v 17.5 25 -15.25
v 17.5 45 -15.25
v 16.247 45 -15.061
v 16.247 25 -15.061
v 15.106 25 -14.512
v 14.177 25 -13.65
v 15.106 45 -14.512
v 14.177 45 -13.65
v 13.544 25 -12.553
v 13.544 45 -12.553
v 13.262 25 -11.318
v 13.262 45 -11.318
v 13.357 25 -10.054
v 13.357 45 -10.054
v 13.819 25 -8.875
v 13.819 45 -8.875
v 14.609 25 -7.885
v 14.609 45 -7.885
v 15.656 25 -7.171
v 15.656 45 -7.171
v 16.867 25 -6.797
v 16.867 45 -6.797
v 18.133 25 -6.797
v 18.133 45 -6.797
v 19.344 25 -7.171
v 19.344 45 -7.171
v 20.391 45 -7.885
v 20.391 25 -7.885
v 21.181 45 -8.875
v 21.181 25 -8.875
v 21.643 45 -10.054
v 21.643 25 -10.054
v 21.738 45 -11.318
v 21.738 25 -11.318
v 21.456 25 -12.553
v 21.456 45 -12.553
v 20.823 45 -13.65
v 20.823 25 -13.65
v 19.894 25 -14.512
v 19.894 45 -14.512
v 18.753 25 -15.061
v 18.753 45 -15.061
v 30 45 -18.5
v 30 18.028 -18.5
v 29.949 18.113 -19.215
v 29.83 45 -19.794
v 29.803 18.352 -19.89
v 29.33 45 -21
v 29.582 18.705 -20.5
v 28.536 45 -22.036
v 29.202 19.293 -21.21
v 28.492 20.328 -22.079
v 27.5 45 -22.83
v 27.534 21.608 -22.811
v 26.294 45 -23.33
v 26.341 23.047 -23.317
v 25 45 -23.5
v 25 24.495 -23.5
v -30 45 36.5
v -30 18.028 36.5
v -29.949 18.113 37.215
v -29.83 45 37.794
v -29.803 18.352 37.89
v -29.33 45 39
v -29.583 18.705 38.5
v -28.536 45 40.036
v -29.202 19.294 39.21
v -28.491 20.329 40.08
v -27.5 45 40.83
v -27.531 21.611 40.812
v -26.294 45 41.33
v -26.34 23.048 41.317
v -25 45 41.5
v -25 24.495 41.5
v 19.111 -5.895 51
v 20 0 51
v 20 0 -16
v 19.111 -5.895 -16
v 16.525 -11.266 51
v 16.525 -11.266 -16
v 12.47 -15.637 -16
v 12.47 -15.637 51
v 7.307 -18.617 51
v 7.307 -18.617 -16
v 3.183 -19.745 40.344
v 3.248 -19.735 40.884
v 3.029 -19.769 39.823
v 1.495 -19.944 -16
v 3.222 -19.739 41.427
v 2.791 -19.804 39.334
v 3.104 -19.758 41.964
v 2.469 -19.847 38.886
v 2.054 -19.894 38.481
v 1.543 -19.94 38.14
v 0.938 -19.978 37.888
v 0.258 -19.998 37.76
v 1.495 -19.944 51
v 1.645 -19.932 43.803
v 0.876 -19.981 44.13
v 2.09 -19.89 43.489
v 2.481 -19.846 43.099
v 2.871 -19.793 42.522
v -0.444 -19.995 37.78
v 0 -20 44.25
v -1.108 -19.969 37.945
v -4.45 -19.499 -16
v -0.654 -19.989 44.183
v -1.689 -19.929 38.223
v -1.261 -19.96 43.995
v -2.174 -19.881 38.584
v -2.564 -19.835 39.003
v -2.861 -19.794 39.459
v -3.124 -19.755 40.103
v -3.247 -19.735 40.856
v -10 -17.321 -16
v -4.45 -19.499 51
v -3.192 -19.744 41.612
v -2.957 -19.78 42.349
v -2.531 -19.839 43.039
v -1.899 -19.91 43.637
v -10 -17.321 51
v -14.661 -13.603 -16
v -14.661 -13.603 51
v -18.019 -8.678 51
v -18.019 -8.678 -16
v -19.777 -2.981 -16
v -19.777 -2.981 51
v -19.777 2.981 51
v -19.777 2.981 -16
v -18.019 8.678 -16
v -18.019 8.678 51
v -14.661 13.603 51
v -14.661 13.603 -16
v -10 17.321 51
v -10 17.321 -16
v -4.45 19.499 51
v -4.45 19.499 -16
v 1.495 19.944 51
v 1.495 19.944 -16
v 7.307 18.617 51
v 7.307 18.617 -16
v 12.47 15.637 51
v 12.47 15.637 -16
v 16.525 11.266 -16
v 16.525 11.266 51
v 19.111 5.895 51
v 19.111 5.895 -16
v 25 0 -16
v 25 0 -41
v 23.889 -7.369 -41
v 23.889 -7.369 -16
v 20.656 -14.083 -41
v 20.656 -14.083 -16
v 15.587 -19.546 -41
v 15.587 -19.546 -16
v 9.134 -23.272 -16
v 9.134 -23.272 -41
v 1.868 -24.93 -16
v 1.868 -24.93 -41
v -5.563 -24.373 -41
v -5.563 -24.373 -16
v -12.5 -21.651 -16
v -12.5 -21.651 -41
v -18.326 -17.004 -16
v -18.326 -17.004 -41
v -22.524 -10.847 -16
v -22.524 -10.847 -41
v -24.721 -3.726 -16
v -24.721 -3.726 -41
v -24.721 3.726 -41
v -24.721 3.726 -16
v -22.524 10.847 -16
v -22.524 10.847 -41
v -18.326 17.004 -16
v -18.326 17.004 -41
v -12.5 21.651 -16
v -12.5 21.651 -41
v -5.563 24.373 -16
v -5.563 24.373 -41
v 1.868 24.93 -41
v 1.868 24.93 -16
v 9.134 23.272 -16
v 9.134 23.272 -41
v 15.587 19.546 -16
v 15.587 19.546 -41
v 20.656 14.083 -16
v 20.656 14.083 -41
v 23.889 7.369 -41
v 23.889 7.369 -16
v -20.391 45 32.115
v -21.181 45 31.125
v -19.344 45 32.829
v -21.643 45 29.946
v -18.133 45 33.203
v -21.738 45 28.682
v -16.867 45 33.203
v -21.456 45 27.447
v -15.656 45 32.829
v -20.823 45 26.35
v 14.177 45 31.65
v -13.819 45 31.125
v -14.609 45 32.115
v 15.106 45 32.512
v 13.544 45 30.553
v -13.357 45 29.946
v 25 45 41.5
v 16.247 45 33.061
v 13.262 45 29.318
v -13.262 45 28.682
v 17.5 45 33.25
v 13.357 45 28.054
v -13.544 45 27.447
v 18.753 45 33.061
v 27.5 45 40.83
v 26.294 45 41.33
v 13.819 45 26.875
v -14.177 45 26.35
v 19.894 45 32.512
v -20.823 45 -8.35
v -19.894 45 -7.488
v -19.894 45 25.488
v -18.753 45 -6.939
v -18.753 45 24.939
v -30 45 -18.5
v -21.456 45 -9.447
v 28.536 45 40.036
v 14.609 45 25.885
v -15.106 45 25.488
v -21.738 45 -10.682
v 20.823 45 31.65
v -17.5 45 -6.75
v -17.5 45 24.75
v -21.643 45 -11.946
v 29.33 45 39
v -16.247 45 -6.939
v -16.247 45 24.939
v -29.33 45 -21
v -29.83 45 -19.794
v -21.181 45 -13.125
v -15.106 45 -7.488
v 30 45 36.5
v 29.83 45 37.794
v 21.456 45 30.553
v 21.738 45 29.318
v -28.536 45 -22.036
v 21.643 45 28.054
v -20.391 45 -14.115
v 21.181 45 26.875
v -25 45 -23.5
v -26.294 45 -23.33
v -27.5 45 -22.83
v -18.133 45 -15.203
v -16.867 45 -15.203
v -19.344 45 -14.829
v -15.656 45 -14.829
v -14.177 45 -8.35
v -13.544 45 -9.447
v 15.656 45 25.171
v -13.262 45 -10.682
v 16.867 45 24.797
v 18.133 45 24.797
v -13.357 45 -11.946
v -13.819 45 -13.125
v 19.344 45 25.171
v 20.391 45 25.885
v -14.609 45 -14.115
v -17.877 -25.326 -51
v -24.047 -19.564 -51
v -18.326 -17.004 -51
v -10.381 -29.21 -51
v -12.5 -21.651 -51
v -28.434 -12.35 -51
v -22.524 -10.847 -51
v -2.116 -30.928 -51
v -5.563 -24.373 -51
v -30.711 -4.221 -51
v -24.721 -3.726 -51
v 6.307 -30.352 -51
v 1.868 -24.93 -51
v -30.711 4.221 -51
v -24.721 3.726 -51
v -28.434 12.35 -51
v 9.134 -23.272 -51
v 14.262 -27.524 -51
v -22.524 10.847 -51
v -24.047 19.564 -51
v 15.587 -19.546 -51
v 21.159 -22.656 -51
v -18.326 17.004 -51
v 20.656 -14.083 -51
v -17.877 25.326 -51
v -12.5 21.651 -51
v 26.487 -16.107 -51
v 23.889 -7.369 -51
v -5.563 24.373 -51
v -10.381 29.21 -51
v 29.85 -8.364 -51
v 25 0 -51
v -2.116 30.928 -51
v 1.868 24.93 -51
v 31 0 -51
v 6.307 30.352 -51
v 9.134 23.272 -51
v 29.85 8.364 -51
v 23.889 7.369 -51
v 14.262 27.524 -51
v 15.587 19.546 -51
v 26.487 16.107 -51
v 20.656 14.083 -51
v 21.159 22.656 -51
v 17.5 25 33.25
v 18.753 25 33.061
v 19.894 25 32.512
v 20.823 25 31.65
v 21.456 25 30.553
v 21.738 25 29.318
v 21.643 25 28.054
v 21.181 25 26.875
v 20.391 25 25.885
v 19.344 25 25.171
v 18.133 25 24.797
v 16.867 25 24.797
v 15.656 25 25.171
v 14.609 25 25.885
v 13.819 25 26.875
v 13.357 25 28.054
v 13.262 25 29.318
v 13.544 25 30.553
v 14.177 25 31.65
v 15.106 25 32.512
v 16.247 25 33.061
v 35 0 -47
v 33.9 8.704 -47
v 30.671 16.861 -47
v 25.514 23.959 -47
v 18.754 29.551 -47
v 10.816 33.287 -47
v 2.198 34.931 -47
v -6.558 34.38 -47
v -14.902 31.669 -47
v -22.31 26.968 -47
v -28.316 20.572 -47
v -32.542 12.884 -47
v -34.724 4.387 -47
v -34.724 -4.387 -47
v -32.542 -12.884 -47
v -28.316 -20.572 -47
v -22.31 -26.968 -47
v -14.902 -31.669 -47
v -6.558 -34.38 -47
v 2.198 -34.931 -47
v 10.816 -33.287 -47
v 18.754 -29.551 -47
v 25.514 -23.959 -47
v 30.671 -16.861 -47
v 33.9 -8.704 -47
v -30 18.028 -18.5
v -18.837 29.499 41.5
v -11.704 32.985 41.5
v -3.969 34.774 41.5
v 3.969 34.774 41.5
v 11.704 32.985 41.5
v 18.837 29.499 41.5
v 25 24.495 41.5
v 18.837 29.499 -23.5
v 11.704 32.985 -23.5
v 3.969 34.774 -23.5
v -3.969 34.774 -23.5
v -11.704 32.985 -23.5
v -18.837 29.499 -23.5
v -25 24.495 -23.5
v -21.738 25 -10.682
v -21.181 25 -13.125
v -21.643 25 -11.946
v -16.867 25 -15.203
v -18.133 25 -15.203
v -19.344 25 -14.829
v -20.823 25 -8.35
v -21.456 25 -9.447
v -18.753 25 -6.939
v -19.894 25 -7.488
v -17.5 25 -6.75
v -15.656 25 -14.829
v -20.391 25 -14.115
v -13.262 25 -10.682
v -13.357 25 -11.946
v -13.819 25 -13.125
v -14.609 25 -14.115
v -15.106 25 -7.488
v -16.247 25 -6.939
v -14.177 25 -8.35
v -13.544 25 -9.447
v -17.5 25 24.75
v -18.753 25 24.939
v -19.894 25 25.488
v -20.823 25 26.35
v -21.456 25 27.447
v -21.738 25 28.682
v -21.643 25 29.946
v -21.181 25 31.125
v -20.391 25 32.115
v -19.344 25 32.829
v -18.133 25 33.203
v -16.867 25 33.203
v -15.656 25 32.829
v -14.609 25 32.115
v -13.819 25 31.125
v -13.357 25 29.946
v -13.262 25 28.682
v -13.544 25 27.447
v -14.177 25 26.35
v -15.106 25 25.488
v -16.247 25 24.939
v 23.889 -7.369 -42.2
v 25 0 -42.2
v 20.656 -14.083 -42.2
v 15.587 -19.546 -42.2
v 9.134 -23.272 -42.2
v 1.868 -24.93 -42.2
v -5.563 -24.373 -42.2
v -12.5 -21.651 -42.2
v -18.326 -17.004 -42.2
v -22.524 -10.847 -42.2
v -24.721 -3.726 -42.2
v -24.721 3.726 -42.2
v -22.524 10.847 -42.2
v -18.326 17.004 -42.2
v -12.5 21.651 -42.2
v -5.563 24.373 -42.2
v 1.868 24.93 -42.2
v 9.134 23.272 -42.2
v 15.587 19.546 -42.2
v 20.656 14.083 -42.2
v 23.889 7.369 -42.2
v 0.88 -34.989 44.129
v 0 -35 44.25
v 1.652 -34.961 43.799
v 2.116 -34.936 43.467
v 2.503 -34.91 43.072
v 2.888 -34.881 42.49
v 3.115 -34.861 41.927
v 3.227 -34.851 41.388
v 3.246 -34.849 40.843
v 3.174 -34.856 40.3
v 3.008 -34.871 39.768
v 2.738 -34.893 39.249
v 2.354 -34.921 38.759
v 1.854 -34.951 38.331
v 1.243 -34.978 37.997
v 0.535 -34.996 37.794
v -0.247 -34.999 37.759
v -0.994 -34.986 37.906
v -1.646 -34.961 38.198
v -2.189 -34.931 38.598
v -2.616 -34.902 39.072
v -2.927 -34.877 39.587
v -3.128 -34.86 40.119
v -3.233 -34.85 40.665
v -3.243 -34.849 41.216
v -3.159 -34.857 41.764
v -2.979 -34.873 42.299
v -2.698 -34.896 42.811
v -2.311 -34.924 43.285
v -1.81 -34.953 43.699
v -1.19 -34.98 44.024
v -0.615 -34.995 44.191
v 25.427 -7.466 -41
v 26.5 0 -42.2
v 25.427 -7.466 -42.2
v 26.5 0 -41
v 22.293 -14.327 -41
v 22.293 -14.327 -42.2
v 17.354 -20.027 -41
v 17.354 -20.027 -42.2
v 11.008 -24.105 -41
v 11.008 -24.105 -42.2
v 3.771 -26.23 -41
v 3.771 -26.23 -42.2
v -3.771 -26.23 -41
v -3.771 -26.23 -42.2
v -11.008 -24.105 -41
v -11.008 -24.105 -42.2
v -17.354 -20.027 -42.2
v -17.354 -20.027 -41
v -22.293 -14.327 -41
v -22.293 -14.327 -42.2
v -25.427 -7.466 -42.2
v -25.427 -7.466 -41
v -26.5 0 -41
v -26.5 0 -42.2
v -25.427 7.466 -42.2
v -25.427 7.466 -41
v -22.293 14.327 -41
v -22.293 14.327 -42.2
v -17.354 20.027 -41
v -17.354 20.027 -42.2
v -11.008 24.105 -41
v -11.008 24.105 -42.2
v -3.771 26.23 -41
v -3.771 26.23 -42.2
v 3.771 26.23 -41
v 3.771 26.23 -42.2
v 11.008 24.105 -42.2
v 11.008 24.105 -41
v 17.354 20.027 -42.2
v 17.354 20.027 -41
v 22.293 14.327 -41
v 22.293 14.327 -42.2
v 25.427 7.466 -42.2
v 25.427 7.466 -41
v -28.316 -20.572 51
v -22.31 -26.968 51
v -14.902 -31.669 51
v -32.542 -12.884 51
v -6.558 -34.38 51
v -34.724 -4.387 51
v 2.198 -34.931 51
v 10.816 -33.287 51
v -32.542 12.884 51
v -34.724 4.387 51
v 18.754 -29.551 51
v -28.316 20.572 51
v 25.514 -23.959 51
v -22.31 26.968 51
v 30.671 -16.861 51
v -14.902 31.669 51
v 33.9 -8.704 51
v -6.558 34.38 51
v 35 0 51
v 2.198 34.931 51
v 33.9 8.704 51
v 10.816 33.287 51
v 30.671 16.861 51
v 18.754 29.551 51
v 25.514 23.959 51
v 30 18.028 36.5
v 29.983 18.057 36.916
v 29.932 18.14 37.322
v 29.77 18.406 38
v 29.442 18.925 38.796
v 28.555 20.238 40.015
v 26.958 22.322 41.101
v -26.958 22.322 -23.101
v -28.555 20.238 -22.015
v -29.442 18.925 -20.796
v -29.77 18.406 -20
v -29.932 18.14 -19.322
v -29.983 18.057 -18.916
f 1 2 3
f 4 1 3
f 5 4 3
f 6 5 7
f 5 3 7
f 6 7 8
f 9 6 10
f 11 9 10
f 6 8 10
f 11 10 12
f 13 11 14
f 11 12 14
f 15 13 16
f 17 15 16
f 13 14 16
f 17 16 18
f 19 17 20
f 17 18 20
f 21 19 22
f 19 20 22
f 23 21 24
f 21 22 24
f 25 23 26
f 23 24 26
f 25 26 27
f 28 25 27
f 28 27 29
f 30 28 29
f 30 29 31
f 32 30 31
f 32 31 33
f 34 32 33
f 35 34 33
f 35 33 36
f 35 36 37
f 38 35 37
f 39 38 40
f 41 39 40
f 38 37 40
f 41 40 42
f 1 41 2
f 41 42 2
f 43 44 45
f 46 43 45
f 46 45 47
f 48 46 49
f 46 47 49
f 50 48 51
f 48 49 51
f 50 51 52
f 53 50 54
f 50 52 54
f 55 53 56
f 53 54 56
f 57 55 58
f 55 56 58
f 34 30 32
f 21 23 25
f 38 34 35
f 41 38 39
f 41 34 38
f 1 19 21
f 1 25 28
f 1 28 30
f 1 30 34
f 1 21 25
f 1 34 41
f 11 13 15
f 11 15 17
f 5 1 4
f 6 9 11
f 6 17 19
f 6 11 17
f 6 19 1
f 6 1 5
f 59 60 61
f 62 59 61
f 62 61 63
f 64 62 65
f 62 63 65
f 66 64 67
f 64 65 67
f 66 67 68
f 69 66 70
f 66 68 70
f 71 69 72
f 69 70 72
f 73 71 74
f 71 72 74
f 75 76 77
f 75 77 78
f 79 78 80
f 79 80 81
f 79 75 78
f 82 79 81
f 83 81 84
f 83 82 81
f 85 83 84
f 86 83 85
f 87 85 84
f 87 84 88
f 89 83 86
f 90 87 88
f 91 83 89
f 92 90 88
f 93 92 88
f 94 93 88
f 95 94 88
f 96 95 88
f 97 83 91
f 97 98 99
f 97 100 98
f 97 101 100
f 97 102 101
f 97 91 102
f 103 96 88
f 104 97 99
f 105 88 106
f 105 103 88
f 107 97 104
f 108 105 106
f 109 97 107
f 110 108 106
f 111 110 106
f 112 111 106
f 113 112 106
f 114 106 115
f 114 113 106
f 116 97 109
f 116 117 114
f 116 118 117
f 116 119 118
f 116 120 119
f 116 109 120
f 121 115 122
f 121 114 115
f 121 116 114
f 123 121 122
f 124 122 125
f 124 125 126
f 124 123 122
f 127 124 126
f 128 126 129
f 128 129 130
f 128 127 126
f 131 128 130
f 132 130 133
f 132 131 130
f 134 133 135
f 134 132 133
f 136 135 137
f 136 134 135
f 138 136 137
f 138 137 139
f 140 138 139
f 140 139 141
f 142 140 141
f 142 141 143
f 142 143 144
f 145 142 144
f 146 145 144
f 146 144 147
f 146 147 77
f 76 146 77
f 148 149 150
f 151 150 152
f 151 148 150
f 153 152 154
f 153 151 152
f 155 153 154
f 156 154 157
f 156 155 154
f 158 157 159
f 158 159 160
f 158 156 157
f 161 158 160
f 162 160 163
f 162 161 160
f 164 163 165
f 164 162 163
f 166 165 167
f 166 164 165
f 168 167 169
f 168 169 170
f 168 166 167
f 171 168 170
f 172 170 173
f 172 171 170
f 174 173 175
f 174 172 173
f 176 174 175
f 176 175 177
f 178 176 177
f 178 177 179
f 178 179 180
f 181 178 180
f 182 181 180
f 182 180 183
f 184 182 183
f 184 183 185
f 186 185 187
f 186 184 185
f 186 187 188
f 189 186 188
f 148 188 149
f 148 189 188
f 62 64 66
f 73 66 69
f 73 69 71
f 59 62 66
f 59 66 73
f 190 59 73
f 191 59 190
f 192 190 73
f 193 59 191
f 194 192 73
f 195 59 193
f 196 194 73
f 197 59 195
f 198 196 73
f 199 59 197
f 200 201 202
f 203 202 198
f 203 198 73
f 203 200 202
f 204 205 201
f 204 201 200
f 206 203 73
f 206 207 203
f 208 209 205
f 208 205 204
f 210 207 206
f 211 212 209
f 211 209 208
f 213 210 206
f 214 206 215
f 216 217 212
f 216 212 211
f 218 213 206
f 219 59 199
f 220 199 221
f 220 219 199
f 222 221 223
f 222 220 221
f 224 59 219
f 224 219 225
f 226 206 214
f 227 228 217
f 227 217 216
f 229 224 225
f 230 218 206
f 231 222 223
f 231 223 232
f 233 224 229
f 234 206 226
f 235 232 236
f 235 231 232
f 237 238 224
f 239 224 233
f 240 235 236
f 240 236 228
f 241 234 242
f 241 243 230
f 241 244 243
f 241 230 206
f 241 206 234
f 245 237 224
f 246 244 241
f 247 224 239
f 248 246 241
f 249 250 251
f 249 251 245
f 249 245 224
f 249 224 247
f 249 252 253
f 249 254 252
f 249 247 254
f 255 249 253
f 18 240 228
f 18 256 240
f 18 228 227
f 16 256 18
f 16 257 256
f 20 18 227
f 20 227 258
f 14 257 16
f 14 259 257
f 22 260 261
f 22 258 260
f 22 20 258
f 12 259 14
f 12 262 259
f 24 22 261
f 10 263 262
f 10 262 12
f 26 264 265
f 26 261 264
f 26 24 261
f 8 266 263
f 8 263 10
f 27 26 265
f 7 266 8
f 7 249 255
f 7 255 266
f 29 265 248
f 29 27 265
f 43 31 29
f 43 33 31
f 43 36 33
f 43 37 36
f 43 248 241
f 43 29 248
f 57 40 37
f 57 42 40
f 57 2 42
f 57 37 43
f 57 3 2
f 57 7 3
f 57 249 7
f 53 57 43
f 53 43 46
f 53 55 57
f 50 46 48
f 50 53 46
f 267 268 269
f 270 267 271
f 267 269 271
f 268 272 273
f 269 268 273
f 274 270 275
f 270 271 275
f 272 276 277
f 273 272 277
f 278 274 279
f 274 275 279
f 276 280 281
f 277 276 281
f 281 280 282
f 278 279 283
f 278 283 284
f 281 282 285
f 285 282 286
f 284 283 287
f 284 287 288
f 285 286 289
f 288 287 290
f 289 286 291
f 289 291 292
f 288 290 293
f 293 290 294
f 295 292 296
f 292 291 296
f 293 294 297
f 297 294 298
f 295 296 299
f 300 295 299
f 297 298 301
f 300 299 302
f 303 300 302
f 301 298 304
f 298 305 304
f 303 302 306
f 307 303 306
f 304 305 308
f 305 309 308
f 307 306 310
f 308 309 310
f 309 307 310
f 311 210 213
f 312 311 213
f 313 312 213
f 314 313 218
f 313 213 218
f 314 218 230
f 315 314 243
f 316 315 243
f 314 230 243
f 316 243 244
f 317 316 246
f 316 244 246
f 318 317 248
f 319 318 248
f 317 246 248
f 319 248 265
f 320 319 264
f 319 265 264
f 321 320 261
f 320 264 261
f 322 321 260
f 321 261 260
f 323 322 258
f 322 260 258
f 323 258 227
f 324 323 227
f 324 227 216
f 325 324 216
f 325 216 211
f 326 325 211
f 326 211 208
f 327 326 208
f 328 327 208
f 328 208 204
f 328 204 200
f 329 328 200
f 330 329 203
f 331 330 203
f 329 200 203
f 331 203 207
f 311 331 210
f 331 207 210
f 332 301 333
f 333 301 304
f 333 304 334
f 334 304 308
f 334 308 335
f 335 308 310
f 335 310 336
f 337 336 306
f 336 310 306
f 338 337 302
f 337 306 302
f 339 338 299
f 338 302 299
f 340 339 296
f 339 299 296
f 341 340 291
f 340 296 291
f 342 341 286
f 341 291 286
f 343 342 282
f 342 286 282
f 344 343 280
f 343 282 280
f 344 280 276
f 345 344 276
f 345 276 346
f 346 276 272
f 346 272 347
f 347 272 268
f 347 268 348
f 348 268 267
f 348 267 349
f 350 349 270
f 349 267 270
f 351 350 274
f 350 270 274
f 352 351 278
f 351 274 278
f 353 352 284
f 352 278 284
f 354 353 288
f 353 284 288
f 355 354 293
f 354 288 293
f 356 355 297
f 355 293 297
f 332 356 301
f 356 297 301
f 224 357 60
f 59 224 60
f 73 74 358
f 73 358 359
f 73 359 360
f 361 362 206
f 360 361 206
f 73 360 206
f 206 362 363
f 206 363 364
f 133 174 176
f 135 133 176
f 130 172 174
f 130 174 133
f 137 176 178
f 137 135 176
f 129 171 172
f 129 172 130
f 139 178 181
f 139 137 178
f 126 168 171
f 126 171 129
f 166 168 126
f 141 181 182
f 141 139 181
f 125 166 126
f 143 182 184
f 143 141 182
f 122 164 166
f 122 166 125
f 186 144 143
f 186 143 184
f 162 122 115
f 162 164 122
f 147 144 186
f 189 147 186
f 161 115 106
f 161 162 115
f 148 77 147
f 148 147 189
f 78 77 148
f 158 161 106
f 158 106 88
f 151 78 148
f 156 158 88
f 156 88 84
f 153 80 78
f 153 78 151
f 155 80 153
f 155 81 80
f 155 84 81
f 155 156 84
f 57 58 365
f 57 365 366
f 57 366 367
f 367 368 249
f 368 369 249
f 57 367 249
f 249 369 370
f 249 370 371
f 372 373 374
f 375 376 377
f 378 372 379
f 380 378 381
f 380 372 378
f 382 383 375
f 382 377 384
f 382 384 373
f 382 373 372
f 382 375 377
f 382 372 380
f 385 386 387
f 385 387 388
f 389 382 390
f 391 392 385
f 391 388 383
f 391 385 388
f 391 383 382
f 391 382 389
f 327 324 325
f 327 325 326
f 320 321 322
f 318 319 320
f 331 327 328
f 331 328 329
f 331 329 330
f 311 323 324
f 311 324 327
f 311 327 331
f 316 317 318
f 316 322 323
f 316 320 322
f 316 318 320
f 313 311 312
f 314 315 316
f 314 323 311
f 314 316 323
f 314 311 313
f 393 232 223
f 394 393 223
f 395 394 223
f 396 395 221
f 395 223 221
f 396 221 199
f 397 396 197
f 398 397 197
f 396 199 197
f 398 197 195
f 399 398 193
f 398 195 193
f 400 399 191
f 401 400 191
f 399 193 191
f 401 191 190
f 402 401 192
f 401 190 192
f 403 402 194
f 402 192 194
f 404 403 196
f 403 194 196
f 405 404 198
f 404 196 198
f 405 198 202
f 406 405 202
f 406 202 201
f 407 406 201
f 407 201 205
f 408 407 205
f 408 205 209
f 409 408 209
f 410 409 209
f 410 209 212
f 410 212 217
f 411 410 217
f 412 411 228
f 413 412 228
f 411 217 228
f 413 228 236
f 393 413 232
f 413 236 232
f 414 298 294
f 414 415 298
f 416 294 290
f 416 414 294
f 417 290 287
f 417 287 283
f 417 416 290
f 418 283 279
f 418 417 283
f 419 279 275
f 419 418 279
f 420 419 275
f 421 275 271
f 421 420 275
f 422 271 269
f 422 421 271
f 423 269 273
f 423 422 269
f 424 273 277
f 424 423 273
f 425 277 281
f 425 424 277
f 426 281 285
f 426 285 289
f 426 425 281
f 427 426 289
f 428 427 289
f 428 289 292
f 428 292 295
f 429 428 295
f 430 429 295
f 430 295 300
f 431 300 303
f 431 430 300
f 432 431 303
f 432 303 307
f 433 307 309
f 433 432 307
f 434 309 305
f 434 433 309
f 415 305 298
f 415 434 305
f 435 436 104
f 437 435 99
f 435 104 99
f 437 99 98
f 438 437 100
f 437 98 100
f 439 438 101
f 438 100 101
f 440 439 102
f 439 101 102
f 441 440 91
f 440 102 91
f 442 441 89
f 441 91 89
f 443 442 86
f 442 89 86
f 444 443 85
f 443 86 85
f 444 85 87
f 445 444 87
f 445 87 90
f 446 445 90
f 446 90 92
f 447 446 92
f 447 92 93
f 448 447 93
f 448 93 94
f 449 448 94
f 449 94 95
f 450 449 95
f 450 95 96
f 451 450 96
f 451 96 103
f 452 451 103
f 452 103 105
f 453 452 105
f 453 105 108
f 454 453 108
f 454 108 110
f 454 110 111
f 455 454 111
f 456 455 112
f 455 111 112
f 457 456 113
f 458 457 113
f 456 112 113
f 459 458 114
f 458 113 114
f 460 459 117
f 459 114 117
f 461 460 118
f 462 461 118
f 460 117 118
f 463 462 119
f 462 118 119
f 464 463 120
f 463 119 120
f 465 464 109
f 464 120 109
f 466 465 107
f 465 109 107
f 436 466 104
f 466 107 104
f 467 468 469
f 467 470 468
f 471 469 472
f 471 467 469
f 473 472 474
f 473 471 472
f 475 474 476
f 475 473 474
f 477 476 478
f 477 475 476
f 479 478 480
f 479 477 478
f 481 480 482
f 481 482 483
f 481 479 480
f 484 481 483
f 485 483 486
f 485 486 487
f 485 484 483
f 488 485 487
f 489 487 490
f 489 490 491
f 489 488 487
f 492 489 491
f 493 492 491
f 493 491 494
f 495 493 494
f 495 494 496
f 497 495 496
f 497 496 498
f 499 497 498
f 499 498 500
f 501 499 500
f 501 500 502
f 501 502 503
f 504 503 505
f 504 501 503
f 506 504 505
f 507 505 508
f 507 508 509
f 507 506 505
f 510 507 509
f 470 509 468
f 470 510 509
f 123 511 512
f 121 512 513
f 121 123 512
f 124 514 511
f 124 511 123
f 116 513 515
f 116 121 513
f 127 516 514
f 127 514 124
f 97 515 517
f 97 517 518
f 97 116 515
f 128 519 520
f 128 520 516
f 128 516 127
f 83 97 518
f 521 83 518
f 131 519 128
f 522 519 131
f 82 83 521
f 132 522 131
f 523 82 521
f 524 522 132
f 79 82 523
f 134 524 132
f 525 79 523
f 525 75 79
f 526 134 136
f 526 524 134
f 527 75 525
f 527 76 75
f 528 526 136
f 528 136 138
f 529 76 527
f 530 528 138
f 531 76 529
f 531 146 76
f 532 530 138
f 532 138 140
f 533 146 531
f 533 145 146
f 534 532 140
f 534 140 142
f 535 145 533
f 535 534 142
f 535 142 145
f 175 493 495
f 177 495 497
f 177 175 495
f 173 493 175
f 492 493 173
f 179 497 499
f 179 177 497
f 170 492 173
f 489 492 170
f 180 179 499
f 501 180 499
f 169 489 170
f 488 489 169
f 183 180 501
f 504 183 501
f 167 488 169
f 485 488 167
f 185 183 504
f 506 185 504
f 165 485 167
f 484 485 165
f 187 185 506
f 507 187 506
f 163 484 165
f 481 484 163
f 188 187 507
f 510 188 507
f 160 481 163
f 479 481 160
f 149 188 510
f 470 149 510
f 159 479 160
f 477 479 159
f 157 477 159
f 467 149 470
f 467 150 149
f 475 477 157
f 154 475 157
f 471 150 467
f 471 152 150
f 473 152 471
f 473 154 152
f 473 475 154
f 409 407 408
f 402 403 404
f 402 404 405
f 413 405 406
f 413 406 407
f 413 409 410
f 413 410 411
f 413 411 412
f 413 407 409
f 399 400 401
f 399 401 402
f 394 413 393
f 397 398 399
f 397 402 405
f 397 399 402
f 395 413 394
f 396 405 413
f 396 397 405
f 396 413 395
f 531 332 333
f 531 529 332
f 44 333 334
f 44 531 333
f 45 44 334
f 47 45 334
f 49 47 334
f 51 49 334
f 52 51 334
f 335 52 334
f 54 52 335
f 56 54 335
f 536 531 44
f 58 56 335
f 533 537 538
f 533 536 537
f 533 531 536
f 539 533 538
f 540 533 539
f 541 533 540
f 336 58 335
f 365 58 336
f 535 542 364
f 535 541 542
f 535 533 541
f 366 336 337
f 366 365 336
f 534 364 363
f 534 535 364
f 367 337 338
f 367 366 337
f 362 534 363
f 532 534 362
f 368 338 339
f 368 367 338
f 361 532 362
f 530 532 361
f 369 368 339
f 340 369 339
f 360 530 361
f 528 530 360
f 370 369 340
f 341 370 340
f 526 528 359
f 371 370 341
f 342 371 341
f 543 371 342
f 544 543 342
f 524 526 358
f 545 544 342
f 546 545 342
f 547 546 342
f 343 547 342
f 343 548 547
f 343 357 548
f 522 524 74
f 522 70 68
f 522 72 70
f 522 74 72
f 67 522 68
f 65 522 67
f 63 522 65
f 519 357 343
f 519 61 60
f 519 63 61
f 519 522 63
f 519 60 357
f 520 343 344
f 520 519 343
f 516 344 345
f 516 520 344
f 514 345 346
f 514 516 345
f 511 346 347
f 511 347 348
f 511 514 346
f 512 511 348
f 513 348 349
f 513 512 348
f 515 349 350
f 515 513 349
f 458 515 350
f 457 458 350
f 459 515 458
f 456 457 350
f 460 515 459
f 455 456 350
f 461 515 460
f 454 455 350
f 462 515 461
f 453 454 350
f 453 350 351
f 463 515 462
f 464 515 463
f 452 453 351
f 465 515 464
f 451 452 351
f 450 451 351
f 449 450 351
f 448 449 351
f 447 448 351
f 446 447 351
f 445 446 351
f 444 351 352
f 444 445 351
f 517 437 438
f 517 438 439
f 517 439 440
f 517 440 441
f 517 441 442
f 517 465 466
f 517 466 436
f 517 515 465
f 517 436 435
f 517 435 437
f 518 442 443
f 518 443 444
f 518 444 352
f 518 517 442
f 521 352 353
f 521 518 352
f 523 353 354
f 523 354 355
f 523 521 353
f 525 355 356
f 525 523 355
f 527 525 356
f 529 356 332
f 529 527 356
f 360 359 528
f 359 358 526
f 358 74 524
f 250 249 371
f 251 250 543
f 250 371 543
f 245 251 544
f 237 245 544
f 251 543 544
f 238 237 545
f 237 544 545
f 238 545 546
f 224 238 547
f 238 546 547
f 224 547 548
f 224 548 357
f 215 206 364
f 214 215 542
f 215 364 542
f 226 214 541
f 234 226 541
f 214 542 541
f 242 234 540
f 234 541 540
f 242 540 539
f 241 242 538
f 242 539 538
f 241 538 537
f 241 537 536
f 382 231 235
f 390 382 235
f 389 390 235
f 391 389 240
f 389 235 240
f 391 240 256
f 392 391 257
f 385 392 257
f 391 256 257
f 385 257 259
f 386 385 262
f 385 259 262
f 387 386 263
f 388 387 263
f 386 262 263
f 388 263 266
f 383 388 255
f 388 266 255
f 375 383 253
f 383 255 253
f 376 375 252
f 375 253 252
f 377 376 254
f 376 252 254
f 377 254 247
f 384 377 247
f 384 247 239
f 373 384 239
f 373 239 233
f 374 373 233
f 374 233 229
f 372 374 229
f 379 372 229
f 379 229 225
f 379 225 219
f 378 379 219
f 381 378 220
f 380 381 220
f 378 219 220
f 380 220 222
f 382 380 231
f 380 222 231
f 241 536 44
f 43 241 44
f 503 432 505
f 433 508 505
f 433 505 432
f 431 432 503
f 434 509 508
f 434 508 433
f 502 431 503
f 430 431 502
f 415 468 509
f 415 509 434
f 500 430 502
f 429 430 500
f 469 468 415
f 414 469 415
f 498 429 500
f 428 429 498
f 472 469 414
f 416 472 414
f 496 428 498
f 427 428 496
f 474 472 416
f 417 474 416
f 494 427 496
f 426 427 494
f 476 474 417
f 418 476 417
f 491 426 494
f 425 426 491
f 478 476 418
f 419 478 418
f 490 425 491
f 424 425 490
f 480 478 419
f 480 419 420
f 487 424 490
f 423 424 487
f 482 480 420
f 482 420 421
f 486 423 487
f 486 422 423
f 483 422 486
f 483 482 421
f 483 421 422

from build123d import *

# Parameters (mm, degrees)
ESBO_O1_R                = 35
RESSALTO_EXTRUS_O1_DEPTH = 51
RESSALTO_EXTRUS_O2_DEPTH = 45
CHANFRO1_SIZE            = 4
ESBO_O4_R                = 4.25
CORTE_EXTRUS_O1_DEPTH    = 20
ESBO_O5_R                = 3.25
CORTE_EXTRUS_O2_DEPTH    = 36.0000001


with BuildPart() as part:
    # Esboço1 → Ressalto-extrusão1 (new body, symmetric)
    with BuildSketch(Plane.XY):
        Circle(ESBO_O1_R)
    extrude(amount=RESSALTO_EXTRUS_O1_DEPTH, both=True)

    # Esboço3 → Ressalto-extrusão2 (add)
    with BuildSketch(Plane(origin=(0, 0, 0), x_dir=(1, 0, 0), z_dir=(0, 1, 0))):
        with BuildLine():
            Line((-25, -41.5), (25, -41.5))
            ThreePointArc((25, -41.5), (28.535533906, -40.035533906), (30, -36.5))
            Line((30, -36.5), (30, 18.5))
            ThreePointArc((30, 18.5), (28.535533906, 22.035533906), (25, 23.5))
            Line((25, 23.5), (-25, 23.5))
            ThreePointArc((-25, 23.5), (-28.535533906, 22.035533906), (-30, 18.5))
            Line((-30, 18.5), (-30, -36.5))
            ThreePointArc((-30, -36.5), (-28.535533906, -40.035533906), (-25, -41.5))
        make_face()
    extrude(amount=RESSALTO_EXTRUS_O2_DEPTH)

    # Esboço2 → Corte-Revolução1 (revolve, cut)
    with BuildSketch(Plane(origin=(0, 0, 0), x_dir=(0, 0, -1), z_dir=(1, 0, 0)), mode=Mode.PRIVATE) as corte_revolu_o1_sk:
        Polygon((51, 25), (42.2, 25), (42.2, 26.5), (41, 26.5), (41, 25), (16, 25), (16, 20), (-51, 20), (-51, 0), (51, 0), align=None)
    revolve(corte_revolu_o1_sk.sketch.rotate(Axis((0, 0, 52.957916626), (0, 0, -1)), 90), axis=Axis((0, 0, 52.957916626), (0, 0, -1)), mode=Mode.SUBTRACT)  # turned: the seam where the file's is

    # Chanfro1
    chanfro1_edges = [part.edges().sort_by_distance(p)[0] for p in [
        (-35, 0, -51),
    ]]
    chamfer(chanfro1_edges, length=CHANFRO1_SIZE)

    # Esboço4 → Corte-extrusão1 (cut)
    with BuildSketch(Plane(origin=(0, 45, 0), x_dir=(1, 0, 0), z_dir=(0, 1, 0))):
        with Locations(Location((-17.5, 11, 0), (0, 0, 270))):  # turned: the seam where the file's is
            Circle(ESBO_O4_R)
        with Locations(Location((17.5, 11, 0), (0, 0, 90))):  # turned: the seam where the file's is
            Circle(ESBO_O4_R)
        with Locations(Location((17.5, -29, 0), (0, 0, 270))):  # turned: the seam where the file's is
            Circle(ESBO_O4_R)
        with Locations(Location((-17.5, -29, 0), (0, 0, 90))):  # turned: the seam where the file's is
            Circle(ESBO_O4_R)
    extrude(amount=-CORTE_EXTRUS_O1_DEPTH, mode=Mode.SUBTRACT)

    # Esboço5 → Corte-extrusão2 (cut, through all)
    with BuildSketch(Plane(origin=(0, 0, 0), x_dir=(1, 0, 0), z_dir=(0, 1, 0))):
        with Locations(Location((0, -41, 0), (0, 0, 270))):  # turned: the seam where the file's is
            Circle(ESBO_O5_R)
    extrude(amount=-CORTE_EXTRUS_O2_DEPTH, mode=Mode.SUBTRACT)


solid = part.part
